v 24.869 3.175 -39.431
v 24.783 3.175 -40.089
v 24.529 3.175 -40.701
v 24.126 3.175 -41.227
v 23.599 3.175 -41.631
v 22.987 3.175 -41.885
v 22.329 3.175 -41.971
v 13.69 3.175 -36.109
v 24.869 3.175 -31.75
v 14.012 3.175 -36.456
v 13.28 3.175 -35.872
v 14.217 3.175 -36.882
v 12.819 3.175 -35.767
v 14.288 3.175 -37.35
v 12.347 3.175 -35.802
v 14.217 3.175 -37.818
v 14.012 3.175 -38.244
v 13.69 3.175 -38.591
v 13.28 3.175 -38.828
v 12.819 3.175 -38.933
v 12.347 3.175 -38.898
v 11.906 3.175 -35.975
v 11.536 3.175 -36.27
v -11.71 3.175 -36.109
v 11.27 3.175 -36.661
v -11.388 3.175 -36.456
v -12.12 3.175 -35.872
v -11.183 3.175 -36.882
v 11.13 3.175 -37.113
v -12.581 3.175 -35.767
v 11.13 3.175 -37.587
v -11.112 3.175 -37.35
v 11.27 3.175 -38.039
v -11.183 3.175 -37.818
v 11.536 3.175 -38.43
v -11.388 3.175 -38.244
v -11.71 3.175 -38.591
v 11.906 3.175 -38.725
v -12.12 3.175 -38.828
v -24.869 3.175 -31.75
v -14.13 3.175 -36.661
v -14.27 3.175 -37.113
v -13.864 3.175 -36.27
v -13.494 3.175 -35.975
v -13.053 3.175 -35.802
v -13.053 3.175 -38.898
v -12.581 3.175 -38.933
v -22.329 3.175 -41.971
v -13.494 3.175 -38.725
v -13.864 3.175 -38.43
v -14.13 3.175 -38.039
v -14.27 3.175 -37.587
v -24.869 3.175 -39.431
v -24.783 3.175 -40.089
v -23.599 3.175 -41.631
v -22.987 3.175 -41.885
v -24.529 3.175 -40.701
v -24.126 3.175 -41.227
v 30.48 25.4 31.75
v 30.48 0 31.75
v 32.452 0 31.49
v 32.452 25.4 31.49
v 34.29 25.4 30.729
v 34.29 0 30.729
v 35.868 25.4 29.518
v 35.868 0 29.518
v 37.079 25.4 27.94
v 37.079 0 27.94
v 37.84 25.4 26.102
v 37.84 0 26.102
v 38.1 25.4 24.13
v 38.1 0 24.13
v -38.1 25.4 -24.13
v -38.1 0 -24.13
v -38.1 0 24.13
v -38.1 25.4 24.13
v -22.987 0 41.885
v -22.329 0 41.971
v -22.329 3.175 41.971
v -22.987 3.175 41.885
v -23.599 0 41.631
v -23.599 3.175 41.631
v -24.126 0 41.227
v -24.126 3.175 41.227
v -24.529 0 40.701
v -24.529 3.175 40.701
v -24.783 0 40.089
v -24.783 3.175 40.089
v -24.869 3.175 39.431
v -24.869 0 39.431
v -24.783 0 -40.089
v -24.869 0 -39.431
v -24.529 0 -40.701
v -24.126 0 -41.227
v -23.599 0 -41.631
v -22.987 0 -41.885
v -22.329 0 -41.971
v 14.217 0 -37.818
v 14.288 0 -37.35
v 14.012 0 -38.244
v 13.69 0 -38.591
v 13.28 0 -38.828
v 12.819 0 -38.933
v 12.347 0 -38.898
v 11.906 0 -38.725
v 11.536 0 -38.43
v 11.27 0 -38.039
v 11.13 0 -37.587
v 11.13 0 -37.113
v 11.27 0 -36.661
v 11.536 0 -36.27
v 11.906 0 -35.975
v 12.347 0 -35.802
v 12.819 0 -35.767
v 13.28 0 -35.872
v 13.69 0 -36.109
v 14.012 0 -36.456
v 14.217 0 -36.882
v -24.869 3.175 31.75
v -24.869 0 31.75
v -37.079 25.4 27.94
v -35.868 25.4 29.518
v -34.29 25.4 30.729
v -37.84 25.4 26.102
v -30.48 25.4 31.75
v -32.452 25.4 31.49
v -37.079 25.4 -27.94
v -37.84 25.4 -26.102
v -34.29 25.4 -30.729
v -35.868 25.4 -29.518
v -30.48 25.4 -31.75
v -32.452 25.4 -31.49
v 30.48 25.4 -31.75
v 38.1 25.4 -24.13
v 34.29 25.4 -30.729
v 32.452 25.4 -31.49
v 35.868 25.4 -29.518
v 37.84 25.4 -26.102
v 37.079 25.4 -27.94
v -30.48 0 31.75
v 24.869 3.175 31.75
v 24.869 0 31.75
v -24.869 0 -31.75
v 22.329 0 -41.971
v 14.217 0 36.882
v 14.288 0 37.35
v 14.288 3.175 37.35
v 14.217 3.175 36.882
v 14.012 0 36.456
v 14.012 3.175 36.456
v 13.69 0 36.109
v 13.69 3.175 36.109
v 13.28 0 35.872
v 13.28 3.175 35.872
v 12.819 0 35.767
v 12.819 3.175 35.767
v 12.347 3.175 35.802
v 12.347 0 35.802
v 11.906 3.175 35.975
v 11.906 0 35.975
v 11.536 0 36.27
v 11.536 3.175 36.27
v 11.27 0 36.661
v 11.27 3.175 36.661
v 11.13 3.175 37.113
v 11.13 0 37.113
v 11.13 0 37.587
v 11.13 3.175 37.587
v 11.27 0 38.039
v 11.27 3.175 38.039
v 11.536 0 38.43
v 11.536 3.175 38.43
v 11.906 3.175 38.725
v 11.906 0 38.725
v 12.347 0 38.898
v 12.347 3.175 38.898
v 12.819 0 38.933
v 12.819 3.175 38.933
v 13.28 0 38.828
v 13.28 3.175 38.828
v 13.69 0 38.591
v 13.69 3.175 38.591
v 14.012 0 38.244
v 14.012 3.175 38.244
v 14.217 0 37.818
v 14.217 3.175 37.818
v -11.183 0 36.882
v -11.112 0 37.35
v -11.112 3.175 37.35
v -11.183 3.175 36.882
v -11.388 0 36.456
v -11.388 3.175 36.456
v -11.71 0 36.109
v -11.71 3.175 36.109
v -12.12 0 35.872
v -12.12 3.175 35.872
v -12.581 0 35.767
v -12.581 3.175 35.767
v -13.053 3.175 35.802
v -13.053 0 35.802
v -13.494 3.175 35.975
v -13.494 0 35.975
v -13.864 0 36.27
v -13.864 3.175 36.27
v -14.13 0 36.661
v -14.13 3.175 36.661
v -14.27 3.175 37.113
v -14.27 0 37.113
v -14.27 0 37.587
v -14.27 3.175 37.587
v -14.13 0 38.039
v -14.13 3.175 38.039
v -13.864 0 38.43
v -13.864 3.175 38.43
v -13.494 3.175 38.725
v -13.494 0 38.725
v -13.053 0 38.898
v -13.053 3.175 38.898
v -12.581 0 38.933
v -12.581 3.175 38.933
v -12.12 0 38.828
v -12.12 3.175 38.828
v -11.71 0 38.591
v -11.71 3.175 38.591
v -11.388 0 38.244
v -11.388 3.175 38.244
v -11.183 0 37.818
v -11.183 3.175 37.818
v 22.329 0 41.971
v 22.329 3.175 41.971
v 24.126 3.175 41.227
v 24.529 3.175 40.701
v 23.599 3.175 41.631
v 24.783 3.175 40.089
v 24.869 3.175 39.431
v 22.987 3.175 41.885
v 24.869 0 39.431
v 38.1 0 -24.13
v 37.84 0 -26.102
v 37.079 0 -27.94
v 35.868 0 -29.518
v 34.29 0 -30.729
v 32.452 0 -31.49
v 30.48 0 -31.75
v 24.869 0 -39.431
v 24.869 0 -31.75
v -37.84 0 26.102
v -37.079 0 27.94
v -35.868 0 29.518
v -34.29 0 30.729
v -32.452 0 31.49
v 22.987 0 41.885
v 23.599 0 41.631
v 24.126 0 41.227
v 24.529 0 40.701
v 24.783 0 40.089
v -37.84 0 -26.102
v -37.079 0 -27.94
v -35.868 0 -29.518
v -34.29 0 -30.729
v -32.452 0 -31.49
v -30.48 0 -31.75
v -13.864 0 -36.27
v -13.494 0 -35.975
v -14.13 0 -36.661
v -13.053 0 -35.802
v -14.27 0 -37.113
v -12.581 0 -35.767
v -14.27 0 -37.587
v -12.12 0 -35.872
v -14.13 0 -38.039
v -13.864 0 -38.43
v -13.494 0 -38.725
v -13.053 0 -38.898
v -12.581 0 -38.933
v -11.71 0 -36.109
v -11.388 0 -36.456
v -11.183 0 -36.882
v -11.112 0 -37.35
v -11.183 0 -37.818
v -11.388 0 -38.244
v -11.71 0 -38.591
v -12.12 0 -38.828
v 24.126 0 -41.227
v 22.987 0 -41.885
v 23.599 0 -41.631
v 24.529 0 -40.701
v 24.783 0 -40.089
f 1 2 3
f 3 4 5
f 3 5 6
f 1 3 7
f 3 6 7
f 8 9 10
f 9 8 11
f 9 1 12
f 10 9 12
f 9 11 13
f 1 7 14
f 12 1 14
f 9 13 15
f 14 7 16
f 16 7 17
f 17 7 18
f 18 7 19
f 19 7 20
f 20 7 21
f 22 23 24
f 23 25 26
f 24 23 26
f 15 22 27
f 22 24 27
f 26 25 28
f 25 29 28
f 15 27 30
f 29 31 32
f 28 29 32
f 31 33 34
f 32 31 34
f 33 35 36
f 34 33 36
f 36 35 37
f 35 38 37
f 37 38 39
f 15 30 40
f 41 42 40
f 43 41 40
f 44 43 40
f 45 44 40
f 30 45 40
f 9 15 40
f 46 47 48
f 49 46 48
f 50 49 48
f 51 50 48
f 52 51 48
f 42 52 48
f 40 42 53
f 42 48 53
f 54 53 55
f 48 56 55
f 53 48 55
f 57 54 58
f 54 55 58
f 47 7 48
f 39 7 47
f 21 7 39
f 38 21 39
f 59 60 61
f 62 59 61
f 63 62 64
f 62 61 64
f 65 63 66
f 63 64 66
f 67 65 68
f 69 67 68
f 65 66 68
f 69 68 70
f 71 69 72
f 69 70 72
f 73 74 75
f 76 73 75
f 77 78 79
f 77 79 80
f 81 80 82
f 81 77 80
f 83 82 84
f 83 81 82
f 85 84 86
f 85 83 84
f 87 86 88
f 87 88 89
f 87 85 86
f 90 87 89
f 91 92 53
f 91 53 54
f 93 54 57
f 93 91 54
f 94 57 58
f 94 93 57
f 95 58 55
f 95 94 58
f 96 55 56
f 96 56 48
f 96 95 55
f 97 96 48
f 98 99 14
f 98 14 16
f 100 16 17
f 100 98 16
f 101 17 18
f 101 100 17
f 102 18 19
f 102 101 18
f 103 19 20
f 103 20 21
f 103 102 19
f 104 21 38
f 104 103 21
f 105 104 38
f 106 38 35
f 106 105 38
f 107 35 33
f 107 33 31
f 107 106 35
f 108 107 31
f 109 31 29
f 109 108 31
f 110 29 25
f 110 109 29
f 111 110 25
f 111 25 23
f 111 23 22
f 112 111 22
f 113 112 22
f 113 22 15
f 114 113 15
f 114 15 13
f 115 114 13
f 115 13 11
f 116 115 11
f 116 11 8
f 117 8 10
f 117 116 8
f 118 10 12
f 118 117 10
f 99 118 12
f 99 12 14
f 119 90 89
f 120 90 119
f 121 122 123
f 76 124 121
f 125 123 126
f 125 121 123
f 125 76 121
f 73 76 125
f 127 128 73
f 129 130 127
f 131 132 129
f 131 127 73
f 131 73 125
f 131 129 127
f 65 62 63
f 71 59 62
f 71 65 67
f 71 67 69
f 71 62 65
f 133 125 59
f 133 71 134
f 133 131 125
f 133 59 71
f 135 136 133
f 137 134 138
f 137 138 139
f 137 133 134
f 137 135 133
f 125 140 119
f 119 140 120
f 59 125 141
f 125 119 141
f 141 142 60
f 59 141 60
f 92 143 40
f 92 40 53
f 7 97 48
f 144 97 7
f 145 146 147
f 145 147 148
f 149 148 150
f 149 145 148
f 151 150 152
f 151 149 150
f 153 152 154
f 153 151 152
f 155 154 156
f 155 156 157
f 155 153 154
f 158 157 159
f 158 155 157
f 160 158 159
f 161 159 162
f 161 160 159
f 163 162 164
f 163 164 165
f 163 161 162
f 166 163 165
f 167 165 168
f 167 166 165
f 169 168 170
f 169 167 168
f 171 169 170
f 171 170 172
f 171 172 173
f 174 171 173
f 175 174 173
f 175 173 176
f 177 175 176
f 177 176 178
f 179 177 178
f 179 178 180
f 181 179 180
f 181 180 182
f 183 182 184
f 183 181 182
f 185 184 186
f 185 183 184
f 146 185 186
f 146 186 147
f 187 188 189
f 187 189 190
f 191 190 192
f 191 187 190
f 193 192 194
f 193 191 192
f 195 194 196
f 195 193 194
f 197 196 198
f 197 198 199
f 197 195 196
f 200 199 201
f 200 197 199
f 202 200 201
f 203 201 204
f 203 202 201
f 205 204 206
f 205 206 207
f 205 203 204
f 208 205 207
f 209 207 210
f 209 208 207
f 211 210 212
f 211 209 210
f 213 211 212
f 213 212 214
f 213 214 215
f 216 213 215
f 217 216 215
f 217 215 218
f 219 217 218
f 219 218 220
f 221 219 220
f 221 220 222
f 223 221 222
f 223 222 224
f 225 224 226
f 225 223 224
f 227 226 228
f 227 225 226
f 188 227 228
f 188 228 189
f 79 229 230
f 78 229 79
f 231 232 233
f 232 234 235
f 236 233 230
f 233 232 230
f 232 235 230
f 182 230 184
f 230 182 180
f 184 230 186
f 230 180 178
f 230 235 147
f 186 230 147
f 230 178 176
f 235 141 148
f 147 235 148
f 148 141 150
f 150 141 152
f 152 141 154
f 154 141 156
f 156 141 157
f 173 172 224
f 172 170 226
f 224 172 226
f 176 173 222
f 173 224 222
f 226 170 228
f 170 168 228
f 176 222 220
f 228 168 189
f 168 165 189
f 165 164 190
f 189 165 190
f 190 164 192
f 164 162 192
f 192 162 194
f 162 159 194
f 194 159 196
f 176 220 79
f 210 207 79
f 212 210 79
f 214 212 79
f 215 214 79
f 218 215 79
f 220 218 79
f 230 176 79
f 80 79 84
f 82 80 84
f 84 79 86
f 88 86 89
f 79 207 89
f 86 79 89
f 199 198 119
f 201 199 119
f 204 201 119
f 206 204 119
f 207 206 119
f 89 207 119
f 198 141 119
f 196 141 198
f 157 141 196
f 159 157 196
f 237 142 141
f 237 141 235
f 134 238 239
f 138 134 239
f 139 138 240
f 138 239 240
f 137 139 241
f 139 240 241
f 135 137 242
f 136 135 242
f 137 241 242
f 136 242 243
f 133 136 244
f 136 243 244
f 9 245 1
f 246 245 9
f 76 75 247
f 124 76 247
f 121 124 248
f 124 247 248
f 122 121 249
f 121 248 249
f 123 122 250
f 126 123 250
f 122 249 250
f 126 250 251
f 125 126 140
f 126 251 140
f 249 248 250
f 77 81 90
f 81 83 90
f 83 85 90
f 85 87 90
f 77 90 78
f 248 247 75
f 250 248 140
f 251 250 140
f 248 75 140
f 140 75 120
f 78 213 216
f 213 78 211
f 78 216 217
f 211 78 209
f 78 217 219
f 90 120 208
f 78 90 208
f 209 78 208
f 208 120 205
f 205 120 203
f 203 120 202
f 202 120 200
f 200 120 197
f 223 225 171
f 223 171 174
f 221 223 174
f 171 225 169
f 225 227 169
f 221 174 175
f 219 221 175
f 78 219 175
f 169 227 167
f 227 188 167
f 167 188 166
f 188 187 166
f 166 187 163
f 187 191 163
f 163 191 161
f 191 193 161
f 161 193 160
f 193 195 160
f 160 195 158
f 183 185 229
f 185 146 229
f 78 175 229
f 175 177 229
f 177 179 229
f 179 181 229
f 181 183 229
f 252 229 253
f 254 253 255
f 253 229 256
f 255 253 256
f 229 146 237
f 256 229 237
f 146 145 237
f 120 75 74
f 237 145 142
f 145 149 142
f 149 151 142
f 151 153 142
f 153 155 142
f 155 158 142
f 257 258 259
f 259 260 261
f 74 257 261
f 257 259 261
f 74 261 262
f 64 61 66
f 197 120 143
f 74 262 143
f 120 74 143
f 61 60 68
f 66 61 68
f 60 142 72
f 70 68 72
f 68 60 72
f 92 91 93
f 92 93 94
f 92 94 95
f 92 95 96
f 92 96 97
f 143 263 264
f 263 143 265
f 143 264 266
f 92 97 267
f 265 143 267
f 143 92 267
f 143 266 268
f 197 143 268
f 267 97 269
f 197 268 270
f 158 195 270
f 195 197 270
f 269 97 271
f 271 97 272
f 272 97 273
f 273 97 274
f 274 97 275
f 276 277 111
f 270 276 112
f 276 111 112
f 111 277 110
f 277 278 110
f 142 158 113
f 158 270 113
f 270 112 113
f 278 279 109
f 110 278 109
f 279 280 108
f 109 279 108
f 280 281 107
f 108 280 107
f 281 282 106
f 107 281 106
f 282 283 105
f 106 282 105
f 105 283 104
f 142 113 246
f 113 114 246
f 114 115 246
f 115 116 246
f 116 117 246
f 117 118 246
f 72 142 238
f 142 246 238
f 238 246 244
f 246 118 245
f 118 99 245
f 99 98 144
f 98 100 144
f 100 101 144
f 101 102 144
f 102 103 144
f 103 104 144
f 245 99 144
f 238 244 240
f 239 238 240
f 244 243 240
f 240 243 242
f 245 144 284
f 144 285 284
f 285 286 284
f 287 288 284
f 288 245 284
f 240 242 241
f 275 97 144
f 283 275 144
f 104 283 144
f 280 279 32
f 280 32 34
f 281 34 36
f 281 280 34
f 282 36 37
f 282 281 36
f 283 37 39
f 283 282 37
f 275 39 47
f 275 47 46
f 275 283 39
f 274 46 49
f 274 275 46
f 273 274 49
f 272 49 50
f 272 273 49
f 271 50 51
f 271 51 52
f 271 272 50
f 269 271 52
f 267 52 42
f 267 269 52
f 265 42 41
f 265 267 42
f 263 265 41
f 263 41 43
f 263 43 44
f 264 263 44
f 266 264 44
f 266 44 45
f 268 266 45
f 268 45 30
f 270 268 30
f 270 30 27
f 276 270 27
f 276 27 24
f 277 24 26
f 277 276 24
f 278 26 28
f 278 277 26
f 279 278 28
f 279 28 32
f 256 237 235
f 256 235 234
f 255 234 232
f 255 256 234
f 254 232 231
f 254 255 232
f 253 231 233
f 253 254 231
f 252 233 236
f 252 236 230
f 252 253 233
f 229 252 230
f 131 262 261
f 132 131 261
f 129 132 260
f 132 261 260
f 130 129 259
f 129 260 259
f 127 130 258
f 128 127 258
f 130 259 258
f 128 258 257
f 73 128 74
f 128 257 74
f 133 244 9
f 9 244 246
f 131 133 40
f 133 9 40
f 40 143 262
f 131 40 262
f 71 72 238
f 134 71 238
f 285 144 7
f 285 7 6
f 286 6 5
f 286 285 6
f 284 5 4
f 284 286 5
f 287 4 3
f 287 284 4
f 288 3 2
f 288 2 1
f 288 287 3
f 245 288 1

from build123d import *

# Parameters (mm, degrees)
BOSS_EXTRUDE1_DEPTH = 25.4
SKETCH2_R           = 1.5875
BOSS_EXTRUDE2_DEPTH = 3.175


with BuildPart() as part:
    # Sketch1 → Boss-Extrude1 (new body)
    with BuildSketch(Plane(origin=(0, 0, 0), x_dir=(1, 0, 0), z_dir=(0, 1, 0))):
        with BuildLine():
            Line((-30.48, -31.75), (30.48, -31.75))
            ThreePointArc((30.48, -31.75), (35.868153673, -29.518153673), (38.1, -24.13))
            Line((38.1, -24.13), (38.1, 24.13))
            ThreePointArc((38.1, 24.13), (35.868153673, 29.518153673), (30.48, 31.75))
            Line((30.48, 31.75), (-30.48, 31.75))
            ThreePointArc((-30.48, 31.75), (-35.868153673, 29.518153673), (-38.1, 24.13))
            Line((-38.1, 24.13), (-38.1, -24.13))
            ThreePointArc((-38.1, -24.13), (-35.868153673, -29.518153673), (-30.48, -31.75))
        make_face()
    extrude(amount=BOSS_EXTRUDE1_DEPTH)

    # Sketch2 → Boss-Extrude2 (add)
    with BuildSketch(Plane(origin=(0, 0, 0), x_dir=(1, 0, 0), z_dir=(0, 1, 0))):
        with BuildLine():
            Line((-24.869490834, -31.75), (24.869490834, -31.75))
            Line((24.869490834, -31.75), (24.869490834, -39.431167642))
            ThreePointArc((24.869490834, -39.431167642), (24.125542058, -41.227218866), (22.329490834, -41.971167642))
            Line((22.329490834, -41.971167642), (-22.329490834, -41.971167642))
            ThreePointArc((-22.329490834, -41.971167642), (-24.125542058, -41.227218866), (-24.869490834, -39.431167642))
            Line((-24.869490834, -39.431167642), (-24.869490834, -31.75))
        make_face()
        with Locations((12.7, -37.35)):
            Circle(SKETCH2_R, mode=Mode.SUBTRACT)
        with Locations((-12.7, -37.35)):
            Circle(SKETCH2_R, mode=Mode.SUBTRACT)
        with BuildLine():
            Line((-24.869490834, 31.75), (-24.869490834, 39.431167642))
            ThreePointArc((-24.869490834, 39.431167642), (-24.125542058, 41.227218866), (-22.329490834, 41.971167642))
            Line((-22.329490834, 41.971167642), (22.329490834, 41.971167642))
            ThreePointArc((22.329490834, 41.971167642), (24.125542058, 41.227218866), (24.869490834, 39.431167642))
            Line((24.869490834, 39.431167642), (24.869490834, 31.75))
            Line((24.869490834, 31.75), (-24.869490834, 31.75))
        make_face()
        with Locations((12.7, 37.35)):
            Circle(SKETCH2_R, mode=Mode.SUBTRACT)
        with Locations((-12.7, 37.35)):
            Circle(SKETCH2_R, mode=Mode.SUBTRACT)
    extrude(amount=BOSS_EXTRUDE2_DEPTH)


solid = part.part
